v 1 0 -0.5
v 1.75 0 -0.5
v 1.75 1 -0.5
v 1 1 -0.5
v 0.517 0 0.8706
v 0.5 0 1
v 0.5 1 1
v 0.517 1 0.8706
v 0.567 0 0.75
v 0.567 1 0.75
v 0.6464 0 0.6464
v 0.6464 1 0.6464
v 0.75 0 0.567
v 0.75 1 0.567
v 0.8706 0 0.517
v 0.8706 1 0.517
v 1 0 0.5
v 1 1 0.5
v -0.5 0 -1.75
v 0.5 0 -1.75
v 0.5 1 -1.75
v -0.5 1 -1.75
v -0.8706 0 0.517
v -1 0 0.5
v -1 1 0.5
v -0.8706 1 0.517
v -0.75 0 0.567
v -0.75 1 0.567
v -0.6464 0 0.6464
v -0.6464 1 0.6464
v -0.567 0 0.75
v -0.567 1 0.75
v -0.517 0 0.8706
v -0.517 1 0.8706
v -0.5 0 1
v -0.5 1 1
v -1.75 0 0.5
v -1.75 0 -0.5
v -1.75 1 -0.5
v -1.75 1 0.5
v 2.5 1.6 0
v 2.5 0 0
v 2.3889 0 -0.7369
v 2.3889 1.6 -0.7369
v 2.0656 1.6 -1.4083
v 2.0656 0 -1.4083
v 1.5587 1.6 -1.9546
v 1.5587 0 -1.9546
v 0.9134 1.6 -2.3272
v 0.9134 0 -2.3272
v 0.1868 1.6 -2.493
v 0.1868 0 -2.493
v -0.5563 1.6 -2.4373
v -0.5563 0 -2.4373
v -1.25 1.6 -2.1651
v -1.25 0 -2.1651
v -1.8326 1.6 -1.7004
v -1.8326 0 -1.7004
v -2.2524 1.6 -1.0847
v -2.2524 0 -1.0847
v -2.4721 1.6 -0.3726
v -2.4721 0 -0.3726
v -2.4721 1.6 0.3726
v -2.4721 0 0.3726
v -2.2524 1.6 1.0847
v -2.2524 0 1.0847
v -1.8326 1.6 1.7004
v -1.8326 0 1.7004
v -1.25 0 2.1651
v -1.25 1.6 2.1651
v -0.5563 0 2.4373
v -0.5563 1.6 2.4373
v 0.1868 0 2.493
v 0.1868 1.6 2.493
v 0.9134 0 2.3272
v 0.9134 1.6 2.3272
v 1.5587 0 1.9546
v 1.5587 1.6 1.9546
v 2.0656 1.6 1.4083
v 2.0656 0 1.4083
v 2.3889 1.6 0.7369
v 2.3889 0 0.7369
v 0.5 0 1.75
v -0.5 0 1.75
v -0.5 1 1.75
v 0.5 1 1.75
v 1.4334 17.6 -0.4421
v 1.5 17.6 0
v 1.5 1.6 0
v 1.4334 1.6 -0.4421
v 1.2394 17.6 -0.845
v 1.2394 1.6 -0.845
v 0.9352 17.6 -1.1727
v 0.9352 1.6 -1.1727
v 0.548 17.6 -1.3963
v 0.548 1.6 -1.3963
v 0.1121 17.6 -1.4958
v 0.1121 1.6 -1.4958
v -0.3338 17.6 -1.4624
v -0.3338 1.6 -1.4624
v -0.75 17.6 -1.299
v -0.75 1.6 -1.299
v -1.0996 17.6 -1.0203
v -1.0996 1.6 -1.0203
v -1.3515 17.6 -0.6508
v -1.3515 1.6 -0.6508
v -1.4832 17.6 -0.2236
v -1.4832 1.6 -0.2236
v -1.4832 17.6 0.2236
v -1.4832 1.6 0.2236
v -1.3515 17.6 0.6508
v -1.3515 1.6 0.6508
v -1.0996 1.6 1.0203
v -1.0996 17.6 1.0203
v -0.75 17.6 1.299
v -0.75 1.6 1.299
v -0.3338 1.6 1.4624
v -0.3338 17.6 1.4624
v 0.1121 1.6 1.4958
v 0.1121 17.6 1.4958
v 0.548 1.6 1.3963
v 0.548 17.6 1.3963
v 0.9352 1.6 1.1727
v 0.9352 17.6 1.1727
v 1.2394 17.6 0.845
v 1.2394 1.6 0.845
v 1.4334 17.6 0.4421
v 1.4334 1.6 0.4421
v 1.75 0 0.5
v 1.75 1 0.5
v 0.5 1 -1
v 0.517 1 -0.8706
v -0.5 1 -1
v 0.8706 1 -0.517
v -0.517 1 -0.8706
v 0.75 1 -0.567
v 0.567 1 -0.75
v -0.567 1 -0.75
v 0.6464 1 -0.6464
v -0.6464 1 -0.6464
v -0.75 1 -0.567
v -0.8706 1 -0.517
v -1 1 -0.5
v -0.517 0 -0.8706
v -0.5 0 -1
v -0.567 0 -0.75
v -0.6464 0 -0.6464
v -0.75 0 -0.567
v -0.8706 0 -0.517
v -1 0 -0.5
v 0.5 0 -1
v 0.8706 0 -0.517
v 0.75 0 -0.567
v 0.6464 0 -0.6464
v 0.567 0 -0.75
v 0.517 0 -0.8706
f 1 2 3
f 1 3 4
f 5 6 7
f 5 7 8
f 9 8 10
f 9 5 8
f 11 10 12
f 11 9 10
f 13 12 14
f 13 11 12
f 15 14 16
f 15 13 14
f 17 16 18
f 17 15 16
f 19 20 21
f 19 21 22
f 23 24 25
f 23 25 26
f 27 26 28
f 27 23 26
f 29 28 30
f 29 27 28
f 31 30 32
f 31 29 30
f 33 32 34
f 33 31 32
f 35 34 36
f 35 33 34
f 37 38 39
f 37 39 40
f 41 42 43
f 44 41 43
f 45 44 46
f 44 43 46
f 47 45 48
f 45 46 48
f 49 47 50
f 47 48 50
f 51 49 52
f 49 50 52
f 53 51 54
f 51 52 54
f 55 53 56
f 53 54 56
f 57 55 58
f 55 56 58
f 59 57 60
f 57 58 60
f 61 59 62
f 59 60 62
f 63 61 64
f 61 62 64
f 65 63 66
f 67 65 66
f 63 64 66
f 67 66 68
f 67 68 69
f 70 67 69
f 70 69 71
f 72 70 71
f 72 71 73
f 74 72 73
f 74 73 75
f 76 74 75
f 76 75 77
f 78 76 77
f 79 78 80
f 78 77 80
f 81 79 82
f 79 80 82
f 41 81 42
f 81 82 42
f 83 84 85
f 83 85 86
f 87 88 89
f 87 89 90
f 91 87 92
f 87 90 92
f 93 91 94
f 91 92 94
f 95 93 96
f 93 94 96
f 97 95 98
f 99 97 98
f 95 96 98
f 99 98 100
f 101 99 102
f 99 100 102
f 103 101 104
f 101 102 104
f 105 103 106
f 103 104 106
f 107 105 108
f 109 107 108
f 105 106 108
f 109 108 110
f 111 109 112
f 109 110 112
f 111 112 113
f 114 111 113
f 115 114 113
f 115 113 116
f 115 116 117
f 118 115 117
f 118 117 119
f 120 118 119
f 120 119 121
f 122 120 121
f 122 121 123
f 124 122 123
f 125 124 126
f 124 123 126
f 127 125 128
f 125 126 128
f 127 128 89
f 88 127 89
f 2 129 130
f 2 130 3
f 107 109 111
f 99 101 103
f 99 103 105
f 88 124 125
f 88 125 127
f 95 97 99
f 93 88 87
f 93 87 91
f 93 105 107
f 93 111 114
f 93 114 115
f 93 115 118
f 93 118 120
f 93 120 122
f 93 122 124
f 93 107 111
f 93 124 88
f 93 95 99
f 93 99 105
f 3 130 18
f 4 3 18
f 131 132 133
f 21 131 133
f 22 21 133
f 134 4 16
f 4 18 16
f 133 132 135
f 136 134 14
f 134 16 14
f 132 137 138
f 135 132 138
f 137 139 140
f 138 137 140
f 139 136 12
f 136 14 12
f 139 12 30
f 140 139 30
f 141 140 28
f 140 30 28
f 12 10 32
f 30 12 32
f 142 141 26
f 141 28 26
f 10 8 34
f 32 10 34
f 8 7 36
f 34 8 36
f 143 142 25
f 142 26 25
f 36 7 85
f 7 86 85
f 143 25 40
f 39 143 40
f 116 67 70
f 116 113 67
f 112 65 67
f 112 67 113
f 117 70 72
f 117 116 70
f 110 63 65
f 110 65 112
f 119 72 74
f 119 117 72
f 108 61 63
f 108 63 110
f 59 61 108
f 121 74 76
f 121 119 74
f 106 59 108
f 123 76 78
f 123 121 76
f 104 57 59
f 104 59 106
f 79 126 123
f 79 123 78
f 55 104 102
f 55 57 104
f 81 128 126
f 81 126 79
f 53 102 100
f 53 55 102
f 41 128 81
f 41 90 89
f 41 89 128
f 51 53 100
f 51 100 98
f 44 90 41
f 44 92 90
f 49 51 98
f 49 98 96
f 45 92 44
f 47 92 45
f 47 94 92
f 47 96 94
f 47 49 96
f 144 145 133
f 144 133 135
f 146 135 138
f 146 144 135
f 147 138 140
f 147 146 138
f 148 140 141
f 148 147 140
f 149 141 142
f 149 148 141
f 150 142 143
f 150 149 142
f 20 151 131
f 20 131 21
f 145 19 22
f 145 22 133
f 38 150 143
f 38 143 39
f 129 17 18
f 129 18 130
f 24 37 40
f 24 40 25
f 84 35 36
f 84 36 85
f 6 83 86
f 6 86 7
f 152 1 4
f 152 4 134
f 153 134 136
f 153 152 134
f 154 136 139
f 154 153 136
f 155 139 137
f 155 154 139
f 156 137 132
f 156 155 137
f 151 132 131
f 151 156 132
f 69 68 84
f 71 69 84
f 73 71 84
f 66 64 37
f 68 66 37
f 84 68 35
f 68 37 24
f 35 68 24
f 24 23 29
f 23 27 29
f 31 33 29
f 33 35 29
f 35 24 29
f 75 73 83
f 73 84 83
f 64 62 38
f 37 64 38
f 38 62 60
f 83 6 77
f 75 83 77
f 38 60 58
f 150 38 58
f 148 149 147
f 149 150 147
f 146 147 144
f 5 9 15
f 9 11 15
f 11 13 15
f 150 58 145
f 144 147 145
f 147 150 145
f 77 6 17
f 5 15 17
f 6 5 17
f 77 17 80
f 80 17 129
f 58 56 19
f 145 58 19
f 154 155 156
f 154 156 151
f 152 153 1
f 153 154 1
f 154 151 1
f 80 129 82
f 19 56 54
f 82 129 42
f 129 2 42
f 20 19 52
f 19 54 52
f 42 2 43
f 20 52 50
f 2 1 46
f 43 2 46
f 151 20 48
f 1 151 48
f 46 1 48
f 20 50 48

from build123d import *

# Parameters (mm, degrees)
SKETCH_1_R          = 2.5
EXTRUDE_1_DEPTH     = 1.6
SKETCH_2_R          = 1.5
EXTRUDE_2_DEPTH     = 16
CUT_EXTRUDE_1_DEPTH = 1


with BuildPart() as part:
    # 草图1 → 凸台-拉伸1 (new body)
    with BuildSketch(Plane(origin=(0, 0, 0), x_dir=(1, 0, 0), z_dir=(0, 1, 0))):
        Circle(SKETCH_1_R)
    extrude(amount=EXTRUDE_1_DEPTH)

    # 草图2 → 凸台-拉伸2 (add)
    with BuildSketch(Plane(origin=(0, 1.6, 0), x_dir=(1, 0, 0), z_dir=(0, 1, 0))):
        Circle(SKETCH_2_R)
    extrude(amount=EXTRUDE_2_DEPTH)

    # 草图3 → 切除-拉伸1 (cut)
    with BuildSketch(Plane.XZ):
        with BuildLine():
            Line((-0.5, 1), (-0.5, 1.75))
            Line((-0.5, 1.75), (0.5, 1.75))
            Line((0.5, 1.75), (0.5, 1))
            ThreePointArc((0.5, 1), (0.646446609, 0.646446609), (1, 0.5))
            Line((1, 0.5), (1.75, 0.5))
            Line((1.75, 0.5), (1.75, -0.5))
            Line((1.75, -0.5), (1, -0.5))
            ThreePointArc((1, -0.5), (0.646446609, -0.646446609), (0.5, -1))
            Line((0.5, -1), (0.5, -1.75))
            Line((0.5, -1.75), (-0.5, -1.75))
            Line((-0.5, -1.75), (-0.5, -1))
            ThreePointArc((-0.5, -1), (-0.646446609, -0.646446609), (-1, -0.5))
            Line((-1, -0.5), (-1.75, -0.5))
            Line((-1.75, -0.5), (-1.75, 0.5))
            Line((-1.75, 0.5), (-1, 0.5))
            ThreePointArc((-1, 0.5), (-0.646446609, 0.646446609), (-0.5, 1))
        make_face()
    extrude(amount=-CUT_EXTRUDE_1_DEPTH, mode=Mode.SUBTRACT)


solid = part.part
